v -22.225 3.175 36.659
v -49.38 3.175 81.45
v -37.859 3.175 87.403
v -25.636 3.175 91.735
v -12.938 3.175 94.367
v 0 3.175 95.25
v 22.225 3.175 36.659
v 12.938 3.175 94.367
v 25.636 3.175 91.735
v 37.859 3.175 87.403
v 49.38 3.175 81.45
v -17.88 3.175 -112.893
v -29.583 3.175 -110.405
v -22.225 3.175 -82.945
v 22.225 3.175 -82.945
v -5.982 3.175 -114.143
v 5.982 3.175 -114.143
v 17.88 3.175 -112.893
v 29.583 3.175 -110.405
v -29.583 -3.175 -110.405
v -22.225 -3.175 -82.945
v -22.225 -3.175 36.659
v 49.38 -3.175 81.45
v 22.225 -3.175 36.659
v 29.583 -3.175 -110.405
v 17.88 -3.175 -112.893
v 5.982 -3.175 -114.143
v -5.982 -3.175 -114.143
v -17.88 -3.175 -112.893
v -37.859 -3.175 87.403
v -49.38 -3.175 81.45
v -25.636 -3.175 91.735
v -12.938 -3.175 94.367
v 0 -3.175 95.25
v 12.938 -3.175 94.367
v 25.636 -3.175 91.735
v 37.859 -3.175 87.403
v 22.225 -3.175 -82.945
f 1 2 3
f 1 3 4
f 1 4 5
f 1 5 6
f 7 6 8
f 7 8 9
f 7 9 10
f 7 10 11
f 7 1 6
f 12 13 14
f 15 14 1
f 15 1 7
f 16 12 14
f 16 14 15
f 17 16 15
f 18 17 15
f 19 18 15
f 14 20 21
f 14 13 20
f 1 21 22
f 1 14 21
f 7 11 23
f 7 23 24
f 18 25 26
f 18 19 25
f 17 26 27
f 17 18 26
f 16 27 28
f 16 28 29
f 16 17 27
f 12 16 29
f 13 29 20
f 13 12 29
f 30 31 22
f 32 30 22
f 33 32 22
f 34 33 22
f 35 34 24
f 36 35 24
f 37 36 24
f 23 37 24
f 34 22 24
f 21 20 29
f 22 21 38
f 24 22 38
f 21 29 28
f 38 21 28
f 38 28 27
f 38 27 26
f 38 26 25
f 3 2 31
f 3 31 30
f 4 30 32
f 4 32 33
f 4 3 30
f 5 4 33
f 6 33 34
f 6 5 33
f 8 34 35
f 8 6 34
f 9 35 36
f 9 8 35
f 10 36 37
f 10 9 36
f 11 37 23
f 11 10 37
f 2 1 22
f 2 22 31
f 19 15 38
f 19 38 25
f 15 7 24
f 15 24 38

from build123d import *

# Parameters (mm, degrees)
BOSS_EXTRUDE1_DEPTH = 3.175


with BuildPart() as part:
    # Sketch1 → Boss-Extrude1 (new, symmetric)
    with BuildSketch(Plane(origin=(0, 0, 0), x_dir=(1, 0, 0), z_dir=(0, 1, 0))):
        with BuildLine():
            Line((-22.225, 82.944829198), (-22.225, -36.659057496))
            Line((-22.225, -36.659057496), (-49.38024545, -81.450315281))
            ThreePointArc((-49.38024545, -81.450315281), (0, -95.25), (49.38024545, -81.450315281))
            Line((49.38024545, -81.450315281), (22.225, -36.659057496))
            Line((22.225, -36.659057496), (22.225, 82.944829198))
            Line((22.225, 82.944829198), (29.583016855, 110.405321945))
            ThreePointArc((29.583016855, 110.405321945), (0, 114.3), (-29.583016855, 110.405321945))
            Line((-29.583016855, 110.405321945), (-22.225, 82.944829198))
        make_face()
    extrude(amount=BOSS_EXTRUDE1_DEPTH, both=True)


solid = part.part
